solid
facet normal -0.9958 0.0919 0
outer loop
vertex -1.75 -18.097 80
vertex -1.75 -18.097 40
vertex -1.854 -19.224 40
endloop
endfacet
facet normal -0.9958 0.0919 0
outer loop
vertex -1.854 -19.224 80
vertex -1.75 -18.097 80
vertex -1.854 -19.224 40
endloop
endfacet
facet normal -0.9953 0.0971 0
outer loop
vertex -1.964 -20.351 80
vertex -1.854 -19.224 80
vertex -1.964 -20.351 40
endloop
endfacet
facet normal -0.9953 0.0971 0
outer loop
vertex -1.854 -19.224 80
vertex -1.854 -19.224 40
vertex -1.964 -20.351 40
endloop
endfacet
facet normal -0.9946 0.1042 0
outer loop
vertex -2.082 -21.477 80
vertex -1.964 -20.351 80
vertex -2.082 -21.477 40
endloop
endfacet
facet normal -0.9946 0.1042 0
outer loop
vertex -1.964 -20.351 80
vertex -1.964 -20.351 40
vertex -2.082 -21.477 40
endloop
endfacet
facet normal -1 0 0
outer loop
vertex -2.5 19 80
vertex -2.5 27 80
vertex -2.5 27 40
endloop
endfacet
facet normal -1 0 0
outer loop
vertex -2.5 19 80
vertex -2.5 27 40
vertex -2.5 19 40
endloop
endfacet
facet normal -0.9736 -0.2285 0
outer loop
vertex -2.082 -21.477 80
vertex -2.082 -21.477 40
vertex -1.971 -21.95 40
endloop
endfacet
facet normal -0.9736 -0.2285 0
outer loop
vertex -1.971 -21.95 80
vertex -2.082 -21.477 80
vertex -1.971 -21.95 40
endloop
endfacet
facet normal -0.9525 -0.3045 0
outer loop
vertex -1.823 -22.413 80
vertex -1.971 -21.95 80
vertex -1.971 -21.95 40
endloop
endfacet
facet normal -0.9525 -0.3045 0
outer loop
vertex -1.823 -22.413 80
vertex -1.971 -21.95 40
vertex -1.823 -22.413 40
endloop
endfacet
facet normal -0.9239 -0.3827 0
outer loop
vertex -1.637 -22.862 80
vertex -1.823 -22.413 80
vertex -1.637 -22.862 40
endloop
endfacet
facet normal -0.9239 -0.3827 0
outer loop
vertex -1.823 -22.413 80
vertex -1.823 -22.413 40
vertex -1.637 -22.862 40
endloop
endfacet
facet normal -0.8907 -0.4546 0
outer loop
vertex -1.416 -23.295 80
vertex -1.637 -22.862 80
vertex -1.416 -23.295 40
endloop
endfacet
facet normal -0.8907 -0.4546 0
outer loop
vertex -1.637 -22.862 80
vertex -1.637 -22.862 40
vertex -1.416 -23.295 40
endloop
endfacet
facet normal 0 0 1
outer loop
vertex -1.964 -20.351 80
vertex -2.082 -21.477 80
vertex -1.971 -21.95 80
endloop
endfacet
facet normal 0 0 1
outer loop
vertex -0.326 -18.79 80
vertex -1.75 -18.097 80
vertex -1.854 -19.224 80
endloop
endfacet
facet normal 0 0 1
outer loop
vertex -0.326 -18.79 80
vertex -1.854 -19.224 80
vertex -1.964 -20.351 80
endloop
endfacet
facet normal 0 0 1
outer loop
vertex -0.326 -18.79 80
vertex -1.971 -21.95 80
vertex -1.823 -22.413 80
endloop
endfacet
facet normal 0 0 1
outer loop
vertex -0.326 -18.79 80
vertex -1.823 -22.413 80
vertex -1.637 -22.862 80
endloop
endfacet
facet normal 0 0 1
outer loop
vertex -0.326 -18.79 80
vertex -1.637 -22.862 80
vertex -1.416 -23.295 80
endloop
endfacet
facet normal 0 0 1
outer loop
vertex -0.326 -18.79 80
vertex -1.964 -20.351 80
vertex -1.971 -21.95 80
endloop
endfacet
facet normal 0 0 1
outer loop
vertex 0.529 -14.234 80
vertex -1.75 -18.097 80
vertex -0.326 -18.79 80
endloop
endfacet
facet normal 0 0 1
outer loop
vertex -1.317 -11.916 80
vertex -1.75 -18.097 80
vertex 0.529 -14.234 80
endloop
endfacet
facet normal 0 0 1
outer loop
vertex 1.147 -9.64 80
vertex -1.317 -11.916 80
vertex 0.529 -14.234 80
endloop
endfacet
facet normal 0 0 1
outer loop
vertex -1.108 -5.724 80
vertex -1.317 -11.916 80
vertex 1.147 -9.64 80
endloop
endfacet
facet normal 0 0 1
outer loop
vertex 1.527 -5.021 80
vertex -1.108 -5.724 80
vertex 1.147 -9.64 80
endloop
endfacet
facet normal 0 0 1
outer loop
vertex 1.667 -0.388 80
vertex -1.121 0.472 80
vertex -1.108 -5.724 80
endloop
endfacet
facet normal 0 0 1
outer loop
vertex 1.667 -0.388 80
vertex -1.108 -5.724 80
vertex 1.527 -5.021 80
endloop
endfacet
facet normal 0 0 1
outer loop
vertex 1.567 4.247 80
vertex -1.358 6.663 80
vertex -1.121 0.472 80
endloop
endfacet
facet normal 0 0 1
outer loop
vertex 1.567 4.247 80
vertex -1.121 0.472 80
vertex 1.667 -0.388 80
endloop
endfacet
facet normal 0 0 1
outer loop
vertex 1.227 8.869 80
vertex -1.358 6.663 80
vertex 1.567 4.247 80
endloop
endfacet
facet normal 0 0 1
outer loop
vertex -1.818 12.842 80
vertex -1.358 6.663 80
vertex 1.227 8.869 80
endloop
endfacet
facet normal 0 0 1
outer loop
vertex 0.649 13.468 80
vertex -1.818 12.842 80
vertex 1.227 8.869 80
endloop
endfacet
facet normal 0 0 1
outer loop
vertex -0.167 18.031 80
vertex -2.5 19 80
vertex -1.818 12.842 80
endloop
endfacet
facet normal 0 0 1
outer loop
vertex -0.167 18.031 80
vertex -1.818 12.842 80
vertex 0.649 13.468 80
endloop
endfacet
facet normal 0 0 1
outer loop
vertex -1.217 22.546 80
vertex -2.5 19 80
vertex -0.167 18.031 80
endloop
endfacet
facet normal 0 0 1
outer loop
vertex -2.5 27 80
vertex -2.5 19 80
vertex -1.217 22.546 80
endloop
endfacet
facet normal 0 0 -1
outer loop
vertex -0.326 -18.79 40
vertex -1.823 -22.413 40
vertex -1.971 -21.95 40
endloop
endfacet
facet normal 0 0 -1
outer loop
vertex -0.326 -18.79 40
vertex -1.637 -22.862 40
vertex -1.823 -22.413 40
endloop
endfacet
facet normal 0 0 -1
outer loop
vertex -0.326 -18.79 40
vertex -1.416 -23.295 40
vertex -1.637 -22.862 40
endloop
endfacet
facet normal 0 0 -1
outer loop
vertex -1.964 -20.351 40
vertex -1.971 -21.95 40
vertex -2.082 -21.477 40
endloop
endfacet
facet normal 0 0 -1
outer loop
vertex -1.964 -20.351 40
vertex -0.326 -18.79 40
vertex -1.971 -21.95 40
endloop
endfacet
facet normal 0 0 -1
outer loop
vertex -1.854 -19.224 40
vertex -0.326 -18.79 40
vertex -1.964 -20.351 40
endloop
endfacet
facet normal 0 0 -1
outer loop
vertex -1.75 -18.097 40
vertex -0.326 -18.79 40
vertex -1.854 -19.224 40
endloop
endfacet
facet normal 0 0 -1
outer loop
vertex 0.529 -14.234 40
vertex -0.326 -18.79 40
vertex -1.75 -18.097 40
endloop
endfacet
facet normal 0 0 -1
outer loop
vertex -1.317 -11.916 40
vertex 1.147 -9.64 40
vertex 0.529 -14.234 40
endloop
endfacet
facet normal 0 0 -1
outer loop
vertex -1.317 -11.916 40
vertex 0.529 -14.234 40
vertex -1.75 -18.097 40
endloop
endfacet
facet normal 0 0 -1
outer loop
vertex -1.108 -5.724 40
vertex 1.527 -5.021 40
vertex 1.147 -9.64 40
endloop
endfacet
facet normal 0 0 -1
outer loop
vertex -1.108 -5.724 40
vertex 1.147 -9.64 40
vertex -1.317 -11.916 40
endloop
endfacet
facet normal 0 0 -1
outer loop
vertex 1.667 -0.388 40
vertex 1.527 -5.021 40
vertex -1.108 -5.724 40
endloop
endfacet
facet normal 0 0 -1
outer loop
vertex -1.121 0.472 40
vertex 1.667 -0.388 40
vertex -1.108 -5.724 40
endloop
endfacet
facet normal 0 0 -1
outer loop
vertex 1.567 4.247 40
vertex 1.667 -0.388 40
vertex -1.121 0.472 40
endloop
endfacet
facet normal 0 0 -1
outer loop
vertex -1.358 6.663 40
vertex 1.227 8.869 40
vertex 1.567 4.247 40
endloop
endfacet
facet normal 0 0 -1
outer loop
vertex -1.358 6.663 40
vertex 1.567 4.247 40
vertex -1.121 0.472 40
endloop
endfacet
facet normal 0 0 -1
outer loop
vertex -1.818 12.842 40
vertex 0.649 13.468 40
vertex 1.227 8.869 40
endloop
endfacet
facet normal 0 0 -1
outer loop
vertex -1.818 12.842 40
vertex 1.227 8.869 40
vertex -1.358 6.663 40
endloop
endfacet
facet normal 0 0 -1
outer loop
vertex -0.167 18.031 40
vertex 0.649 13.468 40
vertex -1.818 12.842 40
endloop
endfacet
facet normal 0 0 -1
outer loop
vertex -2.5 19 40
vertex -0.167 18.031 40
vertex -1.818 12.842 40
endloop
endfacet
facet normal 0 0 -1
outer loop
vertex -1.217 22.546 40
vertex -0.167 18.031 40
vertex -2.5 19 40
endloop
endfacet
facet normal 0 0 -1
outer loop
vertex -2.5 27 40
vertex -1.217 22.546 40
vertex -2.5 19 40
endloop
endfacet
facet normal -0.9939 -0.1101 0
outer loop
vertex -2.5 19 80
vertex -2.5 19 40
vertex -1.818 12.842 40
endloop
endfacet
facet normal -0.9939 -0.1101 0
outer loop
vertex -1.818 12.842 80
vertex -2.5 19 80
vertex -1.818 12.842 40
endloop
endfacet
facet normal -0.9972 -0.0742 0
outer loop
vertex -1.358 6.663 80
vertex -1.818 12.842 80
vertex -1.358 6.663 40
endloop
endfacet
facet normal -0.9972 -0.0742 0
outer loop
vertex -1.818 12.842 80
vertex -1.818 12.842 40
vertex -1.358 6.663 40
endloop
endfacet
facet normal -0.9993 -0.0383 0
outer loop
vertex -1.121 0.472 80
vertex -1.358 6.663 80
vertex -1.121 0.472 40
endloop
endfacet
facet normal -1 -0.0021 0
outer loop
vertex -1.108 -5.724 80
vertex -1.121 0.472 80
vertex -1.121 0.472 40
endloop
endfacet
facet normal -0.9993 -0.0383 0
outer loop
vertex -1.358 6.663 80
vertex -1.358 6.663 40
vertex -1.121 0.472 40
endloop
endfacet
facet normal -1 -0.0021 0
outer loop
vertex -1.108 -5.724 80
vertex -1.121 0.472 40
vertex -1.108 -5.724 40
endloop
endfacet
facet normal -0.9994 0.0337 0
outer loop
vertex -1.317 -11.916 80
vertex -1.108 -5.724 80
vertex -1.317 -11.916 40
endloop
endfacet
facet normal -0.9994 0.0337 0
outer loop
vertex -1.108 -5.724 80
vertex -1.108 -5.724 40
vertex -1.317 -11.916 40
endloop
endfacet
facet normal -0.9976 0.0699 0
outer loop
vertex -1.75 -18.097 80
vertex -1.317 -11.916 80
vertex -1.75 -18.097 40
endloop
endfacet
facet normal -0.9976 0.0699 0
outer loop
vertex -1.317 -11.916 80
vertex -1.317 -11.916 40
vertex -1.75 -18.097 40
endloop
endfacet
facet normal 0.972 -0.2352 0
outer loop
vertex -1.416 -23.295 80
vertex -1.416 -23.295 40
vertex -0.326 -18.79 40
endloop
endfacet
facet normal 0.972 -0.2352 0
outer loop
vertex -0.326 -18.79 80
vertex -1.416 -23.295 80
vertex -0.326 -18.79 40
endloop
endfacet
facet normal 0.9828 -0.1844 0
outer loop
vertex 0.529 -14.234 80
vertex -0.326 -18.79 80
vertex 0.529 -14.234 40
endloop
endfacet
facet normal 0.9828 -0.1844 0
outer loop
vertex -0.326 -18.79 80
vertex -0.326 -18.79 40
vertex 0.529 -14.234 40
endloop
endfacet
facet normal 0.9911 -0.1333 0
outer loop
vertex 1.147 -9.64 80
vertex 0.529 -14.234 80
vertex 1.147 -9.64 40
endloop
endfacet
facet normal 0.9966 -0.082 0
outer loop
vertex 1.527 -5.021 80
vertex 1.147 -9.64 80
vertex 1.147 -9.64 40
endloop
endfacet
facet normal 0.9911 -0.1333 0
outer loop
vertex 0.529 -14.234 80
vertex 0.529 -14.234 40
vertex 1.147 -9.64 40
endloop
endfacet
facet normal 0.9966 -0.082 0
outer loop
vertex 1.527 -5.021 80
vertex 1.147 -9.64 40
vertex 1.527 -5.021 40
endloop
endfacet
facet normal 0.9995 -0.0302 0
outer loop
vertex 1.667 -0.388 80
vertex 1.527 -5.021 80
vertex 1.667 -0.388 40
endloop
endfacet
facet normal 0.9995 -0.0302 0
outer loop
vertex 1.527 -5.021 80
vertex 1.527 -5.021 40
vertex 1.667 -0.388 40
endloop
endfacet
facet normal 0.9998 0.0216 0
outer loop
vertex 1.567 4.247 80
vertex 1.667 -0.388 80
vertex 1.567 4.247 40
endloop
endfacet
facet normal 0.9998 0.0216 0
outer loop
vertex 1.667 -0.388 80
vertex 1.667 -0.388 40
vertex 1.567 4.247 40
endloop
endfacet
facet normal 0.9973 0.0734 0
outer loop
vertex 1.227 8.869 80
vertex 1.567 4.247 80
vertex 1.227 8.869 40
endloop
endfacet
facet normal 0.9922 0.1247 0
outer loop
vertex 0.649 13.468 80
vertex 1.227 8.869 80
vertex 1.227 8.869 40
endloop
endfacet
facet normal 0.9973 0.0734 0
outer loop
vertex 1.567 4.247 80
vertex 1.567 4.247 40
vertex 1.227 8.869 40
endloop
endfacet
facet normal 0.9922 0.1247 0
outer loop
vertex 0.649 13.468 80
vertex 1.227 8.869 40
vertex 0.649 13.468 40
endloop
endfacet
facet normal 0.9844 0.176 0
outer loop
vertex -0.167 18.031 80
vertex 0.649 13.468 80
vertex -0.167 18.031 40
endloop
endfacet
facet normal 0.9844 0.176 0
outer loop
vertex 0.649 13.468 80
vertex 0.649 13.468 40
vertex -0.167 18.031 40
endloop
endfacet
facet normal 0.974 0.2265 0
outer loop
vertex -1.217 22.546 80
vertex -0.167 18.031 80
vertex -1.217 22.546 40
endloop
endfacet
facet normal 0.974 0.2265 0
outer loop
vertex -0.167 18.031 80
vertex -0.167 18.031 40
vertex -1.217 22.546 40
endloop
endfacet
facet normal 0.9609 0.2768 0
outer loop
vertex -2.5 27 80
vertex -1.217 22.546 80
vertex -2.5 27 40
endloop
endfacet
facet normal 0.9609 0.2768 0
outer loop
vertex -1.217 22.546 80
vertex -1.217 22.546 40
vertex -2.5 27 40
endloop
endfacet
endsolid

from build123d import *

# Parameters (mm, degrees)
F0_W     = 5
F0_H     = 54
F1_DEPTH = 40
F3_DEPTH = 40
F4_DEPTH = 40
F5_DEPTH = 40


with BuildPart() as f1:
    # F0 (on Top) → F1 (new body)
    with BuildSketch(Plane.XY):
        Rectangle(F0_W, F0_H)
    extrude(amount=F1_DEPTH)

    # F2 (on face) → F3 (cut)
    with BuildSketch(Plane.XY.offset(40)):
        with BuildLine():
            ThreePointArc((-1.750376, -18.09707), (-1.121, 0.471757), (-2.5, 19))
            Line((-2.5, 19), (-2.5, -25))
            ThreePointArc((-2.5, -25), (-2.281968, -23.239421), (-2.082123, -21.476685))
            ThreePointArc((-2.082123, -21.476685), (-2.160412, -19.76291), (-1.750376, -18.09707))
        make_face()
    extrude(amount=-F3_DEPTH, mode=Mode.SUBTRACT)

    # F2 (on face) → F4 (join)
    with BuildSketch(Plane.XY.offset(40)):
        with BuildLine():
            ThreePointArc((-1.415606, -23.295218), (1.646941, 1.930112), (-2.5, 27))
            Line((-2.5, 27), (-2.5, 19))
            ThreePointArc((-2.5, 19), (-1.121, 0.471757), (-1.750376, -18.09707))
            ThreePointArc((-1.750376, -18.09707), (-1.907901, -19.787697), (-2.082123, -21.476685))
            ThreePointArc((-2.082123, -21.476685), (-1.82275, -22.413031), (-1.415606, -23.295218))
        make_face()
    extrude(amount=F4_DEPTH)

    # F1_face (on face) → F5 (cut)
    with BuildSketch(Plane.XY.offset(40)):
        with BuildLine():
            Line((2.5, 27), (2.5, -27))
            Line((2.5, -27), (-2.5, -27))
            Line((-2.5, -27), (-2.5, -25))
            ThreePointArc((-2.5, -25), (-2.281968, -23.239421), (-2.082123, -21.476685))
            ThreePointArc((-2.082123, -21.476685), (-2.160412, -19.76291), (-1.750376, -18.09707))
            ThreePointArc((-1.750376, -18.09707), (-1.121, 0.471757), (-2.5, 19))
            Line((-2.5, 19), (-2.5, 27))
            Line((-2.5, 27), (2.5, 27))
        make_face()
    extrude(amount=-F5_DEPTH, mode=Mode.SUBTRACT)


solid = f1.part
